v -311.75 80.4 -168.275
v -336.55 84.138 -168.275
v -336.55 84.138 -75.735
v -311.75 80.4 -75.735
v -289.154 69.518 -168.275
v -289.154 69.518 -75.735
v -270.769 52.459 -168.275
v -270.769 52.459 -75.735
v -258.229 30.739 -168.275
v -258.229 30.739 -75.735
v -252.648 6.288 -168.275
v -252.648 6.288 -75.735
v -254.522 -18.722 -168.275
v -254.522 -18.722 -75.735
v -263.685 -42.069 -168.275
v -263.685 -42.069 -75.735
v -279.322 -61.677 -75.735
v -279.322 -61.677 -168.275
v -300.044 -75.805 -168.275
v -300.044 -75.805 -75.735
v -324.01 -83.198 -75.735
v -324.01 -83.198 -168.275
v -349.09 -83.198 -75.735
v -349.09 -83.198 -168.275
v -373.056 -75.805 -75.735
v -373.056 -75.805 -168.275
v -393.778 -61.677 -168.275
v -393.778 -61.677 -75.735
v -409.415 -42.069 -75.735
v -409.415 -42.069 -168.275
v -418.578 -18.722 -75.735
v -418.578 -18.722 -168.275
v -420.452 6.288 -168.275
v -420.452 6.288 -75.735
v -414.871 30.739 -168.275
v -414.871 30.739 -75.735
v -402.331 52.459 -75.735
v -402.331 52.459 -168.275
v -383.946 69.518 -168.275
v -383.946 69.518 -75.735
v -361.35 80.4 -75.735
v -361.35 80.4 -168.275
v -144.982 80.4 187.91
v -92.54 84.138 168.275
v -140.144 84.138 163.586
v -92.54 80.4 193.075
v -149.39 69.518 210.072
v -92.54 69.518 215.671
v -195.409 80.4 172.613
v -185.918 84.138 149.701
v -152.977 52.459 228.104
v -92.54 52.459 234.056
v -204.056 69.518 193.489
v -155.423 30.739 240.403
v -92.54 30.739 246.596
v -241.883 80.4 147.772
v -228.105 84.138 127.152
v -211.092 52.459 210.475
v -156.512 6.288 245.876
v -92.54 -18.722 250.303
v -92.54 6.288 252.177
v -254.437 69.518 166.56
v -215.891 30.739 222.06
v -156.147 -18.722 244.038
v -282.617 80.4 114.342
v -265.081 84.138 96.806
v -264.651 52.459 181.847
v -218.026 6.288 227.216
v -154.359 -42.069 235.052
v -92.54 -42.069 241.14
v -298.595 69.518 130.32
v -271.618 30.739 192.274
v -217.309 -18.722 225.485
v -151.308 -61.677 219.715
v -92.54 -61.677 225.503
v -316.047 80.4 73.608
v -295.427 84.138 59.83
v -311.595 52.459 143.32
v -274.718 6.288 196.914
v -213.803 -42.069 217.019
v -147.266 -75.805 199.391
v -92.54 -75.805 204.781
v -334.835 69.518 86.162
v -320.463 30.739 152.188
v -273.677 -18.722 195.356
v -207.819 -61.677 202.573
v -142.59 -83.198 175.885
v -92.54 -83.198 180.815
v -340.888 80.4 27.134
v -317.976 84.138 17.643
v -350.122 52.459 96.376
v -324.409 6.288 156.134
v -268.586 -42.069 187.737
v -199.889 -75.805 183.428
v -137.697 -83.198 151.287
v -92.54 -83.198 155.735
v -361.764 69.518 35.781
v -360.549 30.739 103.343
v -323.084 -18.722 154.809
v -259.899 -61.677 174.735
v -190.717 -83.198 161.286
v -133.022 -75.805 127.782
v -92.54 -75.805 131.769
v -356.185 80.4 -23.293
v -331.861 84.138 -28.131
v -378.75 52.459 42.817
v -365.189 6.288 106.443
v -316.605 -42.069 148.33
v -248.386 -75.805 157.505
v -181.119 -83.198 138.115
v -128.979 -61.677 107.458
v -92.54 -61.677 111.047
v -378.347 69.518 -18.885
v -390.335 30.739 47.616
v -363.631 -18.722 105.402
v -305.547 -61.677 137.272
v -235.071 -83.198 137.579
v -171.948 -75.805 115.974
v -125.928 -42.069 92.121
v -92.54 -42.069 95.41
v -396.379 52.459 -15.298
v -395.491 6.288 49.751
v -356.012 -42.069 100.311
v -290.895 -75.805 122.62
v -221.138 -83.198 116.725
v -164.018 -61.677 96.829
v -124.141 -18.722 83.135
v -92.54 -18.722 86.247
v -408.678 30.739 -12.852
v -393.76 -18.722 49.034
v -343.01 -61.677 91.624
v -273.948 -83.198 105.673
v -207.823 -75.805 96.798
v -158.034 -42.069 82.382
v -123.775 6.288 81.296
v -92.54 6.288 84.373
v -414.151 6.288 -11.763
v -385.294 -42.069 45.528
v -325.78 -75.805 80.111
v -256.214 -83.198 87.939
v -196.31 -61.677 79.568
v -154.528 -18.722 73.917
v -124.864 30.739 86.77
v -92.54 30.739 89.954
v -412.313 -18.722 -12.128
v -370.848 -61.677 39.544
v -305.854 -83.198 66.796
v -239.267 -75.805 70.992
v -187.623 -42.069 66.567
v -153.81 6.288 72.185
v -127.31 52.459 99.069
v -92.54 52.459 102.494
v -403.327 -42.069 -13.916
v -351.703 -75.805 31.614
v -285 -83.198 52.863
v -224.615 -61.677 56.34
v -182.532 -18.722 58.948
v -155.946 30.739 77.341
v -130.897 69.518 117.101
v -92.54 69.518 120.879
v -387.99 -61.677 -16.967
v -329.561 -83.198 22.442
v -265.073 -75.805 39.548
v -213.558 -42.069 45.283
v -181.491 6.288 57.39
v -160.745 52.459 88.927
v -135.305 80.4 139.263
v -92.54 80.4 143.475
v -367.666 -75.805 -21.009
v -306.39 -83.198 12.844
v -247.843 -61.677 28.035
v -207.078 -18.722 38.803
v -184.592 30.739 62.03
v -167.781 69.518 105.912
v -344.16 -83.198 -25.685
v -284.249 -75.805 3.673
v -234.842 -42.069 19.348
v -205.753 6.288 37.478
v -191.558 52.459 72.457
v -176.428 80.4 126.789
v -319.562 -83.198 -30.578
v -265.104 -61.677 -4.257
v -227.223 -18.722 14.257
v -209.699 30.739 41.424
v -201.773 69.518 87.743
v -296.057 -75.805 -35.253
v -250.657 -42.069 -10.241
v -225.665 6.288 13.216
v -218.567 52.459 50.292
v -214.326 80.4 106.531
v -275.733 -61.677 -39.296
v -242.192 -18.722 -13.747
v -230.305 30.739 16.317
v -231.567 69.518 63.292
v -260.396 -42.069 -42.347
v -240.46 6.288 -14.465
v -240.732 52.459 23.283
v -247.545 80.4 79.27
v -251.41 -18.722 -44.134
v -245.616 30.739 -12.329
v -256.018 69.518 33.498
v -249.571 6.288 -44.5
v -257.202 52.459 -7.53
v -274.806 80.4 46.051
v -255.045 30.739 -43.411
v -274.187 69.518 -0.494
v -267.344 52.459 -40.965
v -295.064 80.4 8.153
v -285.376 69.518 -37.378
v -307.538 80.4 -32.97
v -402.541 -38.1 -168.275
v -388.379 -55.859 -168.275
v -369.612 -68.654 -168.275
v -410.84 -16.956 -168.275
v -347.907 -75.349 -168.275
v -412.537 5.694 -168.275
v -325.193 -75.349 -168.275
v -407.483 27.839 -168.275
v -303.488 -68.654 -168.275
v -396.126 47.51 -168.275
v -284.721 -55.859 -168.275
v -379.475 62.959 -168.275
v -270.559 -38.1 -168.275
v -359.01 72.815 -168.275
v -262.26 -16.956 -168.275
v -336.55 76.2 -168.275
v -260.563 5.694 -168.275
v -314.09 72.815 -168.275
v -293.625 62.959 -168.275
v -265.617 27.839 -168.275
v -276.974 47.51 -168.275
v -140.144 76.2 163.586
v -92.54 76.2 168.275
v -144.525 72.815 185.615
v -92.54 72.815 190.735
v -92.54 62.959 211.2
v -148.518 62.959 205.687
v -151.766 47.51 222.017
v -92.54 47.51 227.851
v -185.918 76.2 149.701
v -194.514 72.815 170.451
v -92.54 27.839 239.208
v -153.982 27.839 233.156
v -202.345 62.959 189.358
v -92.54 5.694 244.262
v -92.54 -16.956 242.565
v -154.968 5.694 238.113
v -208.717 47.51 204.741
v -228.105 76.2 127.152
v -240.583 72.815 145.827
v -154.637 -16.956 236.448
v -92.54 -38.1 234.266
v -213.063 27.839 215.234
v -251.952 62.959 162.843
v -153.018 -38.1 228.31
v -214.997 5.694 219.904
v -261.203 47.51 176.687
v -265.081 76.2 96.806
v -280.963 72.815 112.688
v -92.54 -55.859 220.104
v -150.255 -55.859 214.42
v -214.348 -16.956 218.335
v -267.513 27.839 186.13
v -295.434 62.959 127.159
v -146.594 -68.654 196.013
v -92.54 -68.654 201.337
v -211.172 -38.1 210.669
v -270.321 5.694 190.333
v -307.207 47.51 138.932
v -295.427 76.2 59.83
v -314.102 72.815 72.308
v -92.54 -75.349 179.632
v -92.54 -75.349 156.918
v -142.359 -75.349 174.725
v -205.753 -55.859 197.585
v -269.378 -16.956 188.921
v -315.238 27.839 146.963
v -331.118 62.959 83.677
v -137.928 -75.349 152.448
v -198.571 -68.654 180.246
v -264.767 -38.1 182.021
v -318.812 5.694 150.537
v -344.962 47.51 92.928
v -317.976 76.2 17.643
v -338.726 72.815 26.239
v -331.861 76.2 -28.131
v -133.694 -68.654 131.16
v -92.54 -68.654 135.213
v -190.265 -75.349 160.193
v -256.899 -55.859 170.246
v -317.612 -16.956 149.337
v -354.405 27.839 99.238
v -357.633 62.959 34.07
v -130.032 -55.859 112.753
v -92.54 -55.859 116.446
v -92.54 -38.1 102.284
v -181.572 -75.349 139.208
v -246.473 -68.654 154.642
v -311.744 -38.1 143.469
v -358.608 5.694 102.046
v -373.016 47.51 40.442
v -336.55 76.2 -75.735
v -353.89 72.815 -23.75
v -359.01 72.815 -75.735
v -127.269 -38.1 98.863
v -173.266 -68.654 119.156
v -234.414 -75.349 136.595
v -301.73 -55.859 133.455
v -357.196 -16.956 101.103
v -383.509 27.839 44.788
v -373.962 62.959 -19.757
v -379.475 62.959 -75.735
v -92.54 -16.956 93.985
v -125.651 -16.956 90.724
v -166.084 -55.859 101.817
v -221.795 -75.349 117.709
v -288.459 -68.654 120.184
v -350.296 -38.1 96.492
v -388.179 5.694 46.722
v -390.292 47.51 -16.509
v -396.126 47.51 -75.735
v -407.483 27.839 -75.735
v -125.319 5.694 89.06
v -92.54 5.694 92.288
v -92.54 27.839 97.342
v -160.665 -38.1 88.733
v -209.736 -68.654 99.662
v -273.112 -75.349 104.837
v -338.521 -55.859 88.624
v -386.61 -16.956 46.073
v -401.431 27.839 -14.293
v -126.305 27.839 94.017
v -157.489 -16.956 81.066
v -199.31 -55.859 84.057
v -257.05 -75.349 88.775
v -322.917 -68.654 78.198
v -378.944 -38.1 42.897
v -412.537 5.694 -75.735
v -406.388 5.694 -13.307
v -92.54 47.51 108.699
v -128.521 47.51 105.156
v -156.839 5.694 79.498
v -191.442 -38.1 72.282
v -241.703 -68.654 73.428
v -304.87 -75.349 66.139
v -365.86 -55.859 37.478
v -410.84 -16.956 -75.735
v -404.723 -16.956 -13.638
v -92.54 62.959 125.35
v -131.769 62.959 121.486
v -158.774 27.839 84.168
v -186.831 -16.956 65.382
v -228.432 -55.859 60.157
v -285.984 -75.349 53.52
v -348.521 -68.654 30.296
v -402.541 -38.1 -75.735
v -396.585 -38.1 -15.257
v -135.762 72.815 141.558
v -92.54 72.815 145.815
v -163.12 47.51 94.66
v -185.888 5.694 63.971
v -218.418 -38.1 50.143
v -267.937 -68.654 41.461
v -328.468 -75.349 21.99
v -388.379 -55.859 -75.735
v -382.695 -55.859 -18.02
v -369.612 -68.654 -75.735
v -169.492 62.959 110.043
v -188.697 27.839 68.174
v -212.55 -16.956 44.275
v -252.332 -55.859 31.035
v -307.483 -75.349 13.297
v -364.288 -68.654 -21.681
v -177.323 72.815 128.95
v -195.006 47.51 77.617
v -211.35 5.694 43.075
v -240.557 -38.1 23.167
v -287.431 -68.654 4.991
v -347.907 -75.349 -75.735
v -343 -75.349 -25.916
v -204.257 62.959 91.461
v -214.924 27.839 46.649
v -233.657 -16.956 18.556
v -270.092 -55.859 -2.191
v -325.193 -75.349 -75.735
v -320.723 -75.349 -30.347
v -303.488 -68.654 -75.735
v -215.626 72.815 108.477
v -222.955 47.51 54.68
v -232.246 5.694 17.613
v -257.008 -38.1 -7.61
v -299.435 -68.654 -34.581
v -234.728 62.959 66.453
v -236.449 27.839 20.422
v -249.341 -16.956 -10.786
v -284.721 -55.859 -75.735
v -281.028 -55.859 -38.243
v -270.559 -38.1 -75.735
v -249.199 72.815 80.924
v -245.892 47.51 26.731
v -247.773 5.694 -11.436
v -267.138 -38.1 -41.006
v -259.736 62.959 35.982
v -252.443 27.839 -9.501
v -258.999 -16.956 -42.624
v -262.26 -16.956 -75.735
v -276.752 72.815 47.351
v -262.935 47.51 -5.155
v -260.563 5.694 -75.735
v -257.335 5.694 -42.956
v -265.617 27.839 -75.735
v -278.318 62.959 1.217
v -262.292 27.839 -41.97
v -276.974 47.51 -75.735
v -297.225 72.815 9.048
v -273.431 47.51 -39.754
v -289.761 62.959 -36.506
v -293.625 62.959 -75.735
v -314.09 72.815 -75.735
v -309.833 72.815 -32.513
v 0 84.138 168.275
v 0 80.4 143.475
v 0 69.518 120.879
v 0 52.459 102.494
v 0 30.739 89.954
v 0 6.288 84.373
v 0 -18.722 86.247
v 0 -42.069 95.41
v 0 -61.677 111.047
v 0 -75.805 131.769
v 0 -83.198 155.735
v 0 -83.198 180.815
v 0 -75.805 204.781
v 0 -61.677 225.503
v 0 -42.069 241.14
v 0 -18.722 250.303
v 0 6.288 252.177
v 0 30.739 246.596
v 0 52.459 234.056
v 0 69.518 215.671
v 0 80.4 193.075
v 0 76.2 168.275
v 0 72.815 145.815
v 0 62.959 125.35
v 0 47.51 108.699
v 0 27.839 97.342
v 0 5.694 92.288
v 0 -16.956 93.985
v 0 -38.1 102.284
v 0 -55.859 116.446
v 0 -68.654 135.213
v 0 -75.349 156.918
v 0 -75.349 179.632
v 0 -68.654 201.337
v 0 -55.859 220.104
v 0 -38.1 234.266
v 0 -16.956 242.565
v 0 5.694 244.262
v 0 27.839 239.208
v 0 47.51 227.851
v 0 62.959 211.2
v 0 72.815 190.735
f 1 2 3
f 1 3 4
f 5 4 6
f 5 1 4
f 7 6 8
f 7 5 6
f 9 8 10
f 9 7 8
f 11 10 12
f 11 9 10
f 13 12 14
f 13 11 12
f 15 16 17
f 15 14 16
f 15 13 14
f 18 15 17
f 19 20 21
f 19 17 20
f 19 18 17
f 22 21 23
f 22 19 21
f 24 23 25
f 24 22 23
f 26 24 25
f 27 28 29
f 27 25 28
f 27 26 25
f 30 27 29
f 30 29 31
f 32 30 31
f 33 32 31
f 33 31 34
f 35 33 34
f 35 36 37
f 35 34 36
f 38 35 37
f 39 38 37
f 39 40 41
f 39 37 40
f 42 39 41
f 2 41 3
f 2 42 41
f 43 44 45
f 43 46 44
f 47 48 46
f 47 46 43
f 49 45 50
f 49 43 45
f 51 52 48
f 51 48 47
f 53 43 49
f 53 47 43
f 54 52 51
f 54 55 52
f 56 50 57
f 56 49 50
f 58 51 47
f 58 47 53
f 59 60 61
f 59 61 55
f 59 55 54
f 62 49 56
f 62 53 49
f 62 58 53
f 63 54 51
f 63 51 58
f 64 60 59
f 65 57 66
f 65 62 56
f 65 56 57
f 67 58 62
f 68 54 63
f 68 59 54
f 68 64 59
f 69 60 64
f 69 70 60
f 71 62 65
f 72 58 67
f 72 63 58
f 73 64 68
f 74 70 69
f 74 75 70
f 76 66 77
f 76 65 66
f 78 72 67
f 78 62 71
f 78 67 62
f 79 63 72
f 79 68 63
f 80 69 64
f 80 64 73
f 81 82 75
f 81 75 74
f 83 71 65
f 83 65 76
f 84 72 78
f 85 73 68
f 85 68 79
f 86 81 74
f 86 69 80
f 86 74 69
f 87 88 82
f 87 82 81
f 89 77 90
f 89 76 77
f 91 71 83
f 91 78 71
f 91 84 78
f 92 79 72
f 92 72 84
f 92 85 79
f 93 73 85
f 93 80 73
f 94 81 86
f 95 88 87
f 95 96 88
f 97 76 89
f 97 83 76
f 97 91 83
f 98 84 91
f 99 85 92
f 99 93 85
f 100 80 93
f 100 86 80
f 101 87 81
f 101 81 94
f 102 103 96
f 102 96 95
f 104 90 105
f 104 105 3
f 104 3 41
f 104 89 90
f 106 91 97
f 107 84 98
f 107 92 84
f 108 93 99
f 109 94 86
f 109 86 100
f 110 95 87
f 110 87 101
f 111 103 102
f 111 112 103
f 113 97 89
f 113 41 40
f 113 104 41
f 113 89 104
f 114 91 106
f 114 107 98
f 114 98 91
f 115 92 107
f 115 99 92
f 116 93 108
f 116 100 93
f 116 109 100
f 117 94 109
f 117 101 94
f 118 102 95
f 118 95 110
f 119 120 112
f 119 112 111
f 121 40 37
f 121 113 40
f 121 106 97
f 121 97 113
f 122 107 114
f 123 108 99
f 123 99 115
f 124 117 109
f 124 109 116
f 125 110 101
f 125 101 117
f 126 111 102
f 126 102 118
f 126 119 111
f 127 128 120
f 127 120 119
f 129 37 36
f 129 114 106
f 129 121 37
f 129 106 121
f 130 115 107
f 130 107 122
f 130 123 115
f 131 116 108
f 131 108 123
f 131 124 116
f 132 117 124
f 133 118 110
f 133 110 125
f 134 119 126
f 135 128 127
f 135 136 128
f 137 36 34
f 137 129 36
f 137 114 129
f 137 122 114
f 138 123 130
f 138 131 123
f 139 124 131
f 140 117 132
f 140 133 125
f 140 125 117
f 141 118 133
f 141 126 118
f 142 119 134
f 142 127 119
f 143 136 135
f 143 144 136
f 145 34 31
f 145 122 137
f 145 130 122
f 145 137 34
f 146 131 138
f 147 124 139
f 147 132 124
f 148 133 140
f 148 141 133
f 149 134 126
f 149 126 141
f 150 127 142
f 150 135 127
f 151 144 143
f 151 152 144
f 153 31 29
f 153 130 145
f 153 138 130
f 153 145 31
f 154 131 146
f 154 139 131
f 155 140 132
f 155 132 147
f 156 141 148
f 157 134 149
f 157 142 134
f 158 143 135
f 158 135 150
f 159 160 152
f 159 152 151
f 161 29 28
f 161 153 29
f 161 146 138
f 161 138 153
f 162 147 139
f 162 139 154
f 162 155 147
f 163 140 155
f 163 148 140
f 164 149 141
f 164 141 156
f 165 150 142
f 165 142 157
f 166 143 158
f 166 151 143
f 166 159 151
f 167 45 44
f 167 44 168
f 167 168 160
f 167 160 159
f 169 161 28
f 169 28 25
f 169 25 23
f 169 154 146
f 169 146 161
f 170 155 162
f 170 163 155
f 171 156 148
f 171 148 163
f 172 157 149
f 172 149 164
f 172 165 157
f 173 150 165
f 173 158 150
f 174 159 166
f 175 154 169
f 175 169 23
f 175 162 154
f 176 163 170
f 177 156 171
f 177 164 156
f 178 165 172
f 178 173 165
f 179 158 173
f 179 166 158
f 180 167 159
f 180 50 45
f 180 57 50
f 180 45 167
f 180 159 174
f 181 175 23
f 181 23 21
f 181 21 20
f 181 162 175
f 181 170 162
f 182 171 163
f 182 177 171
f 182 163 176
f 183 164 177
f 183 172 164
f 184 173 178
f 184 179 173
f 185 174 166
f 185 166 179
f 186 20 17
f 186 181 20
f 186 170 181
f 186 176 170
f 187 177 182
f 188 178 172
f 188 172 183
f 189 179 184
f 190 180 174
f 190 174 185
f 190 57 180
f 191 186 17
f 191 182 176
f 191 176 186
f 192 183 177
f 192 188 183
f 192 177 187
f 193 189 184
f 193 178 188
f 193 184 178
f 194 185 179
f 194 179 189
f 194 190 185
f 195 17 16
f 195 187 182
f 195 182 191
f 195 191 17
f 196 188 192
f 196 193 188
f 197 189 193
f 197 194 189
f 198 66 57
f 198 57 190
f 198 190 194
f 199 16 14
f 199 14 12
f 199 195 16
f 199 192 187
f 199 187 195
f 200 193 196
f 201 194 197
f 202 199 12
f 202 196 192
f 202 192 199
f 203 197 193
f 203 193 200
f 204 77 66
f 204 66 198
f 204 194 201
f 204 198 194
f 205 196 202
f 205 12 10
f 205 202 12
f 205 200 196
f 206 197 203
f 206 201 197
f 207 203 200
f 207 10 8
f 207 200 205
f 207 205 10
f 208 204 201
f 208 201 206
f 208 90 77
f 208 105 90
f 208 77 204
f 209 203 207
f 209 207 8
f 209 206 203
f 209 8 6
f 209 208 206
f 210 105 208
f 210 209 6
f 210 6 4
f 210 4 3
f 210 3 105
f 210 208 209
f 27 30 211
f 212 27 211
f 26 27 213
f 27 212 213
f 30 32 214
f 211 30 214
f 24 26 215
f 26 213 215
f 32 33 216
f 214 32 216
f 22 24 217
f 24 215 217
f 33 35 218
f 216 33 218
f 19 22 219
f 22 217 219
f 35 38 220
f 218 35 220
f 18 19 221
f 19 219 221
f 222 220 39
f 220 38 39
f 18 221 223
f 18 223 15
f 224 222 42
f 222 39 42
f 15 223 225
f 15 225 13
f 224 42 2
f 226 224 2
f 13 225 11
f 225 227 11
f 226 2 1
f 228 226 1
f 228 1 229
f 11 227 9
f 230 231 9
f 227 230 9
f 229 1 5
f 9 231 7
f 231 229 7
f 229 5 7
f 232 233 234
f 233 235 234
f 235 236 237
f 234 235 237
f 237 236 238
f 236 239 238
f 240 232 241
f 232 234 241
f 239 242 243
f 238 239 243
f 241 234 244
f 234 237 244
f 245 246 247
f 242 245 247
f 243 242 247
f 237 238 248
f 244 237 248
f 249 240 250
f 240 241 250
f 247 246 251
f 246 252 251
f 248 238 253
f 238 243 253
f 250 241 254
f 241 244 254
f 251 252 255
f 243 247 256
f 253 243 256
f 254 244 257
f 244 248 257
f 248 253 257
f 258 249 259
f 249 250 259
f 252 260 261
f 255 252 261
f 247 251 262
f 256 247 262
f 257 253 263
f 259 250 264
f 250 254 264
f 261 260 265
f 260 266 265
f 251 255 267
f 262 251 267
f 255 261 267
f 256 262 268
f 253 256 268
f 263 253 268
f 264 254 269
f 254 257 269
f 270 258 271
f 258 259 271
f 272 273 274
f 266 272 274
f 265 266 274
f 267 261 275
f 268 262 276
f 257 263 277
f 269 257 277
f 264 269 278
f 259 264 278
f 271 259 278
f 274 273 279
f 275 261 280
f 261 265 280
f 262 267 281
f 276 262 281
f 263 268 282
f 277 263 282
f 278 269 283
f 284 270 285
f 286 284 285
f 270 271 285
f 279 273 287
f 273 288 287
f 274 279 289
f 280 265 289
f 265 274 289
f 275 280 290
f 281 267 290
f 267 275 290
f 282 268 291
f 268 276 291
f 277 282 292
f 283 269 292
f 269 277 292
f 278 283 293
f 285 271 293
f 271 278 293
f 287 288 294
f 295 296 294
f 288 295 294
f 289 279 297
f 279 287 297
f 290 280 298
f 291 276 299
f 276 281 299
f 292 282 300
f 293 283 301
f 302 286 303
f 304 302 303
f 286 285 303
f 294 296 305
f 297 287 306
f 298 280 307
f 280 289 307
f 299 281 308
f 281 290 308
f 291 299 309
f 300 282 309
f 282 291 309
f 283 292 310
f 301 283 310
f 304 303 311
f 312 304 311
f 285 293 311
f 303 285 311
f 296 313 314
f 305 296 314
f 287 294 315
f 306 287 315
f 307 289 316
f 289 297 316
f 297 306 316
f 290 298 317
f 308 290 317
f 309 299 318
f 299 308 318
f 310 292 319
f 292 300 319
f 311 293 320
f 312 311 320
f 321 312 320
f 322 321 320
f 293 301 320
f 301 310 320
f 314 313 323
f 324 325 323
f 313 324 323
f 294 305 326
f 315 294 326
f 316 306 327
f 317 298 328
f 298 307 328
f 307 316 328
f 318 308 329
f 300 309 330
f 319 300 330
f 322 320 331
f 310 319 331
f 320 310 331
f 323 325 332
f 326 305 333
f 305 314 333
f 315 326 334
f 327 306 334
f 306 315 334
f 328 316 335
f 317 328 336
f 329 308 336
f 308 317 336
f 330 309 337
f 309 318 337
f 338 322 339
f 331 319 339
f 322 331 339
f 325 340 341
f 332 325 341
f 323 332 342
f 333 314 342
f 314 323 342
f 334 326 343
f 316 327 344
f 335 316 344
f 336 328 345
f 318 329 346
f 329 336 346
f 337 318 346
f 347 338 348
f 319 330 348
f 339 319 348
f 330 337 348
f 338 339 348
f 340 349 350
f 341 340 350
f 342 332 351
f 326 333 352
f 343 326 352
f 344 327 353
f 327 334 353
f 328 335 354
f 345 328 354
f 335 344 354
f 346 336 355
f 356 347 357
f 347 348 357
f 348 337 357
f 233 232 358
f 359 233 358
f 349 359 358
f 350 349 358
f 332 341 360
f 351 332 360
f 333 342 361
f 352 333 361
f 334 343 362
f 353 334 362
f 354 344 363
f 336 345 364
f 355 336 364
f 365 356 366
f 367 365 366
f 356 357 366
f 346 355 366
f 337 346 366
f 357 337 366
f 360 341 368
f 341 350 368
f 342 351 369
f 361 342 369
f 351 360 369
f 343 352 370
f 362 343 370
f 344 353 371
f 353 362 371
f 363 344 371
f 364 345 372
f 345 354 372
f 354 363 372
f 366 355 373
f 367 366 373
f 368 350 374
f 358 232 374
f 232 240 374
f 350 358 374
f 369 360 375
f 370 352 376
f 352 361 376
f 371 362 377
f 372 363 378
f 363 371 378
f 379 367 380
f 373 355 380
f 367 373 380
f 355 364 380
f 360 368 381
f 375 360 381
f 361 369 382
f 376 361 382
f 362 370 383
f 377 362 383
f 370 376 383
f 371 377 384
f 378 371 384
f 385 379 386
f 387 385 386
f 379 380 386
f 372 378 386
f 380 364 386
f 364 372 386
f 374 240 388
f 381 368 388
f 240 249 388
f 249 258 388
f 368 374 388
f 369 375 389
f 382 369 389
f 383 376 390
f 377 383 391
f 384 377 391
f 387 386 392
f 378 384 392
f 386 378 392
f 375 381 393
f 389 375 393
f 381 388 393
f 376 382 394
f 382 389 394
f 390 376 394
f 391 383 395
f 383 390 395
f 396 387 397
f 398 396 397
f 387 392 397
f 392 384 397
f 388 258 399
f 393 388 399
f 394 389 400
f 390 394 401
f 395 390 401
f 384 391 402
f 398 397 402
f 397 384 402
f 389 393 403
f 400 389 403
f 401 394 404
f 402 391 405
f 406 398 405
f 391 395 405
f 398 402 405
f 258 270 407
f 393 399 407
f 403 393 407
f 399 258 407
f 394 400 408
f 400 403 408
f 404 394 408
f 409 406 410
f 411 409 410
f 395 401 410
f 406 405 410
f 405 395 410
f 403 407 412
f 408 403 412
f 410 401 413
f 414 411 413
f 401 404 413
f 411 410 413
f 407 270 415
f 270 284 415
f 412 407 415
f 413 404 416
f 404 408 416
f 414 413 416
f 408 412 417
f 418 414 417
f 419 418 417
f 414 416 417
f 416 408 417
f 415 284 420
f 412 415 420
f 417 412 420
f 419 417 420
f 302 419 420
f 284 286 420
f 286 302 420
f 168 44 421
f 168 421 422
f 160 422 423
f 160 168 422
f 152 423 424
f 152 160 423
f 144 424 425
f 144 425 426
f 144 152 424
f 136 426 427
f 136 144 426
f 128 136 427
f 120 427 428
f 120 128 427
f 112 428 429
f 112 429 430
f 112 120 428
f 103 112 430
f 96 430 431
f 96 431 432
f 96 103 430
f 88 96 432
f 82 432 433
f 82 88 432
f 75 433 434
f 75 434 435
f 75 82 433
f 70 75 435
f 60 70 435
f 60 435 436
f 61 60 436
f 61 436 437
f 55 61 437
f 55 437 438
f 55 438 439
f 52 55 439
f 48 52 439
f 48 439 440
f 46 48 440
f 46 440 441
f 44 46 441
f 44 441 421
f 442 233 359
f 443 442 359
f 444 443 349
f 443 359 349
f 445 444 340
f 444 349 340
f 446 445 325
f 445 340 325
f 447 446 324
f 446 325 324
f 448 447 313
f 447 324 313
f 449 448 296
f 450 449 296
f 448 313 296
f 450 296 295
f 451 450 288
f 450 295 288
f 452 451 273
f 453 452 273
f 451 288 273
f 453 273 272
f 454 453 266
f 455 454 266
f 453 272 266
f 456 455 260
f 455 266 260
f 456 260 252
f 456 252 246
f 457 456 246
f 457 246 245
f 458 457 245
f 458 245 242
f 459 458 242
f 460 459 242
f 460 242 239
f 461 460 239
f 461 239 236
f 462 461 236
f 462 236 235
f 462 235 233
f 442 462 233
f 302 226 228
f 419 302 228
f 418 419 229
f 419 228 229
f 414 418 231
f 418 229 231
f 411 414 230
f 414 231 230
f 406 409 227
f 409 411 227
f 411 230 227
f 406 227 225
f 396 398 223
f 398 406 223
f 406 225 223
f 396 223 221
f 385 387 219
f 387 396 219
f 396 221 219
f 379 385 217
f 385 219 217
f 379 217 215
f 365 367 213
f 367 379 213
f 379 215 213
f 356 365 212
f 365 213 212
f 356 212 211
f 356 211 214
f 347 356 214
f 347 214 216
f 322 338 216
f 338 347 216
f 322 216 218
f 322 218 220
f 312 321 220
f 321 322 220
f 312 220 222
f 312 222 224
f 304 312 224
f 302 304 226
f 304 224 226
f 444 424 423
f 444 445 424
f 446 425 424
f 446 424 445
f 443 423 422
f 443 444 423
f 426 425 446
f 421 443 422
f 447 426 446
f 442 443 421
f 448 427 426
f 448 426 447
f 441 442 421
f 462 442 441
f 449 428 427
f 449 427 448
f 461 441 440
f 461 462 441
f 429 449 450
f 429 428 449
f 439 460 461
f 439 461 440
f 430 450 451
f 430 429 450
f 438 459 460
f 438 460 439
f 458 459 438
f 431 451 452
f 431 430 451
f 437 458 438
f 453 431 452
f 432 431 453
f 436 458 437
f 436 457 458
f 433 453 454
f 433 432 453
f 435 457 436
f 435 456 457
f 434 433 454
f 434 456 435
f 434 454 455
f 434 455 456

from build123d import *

# Parameters (mm, degrees)
F1_R   = 84.1375
F1_R_2 = 76.2


with BuildPart() as f2:
    # F2: sweep along a path in F0
    with BuildLine(Plane.XZ) as f2_path:
        Line((0, 168.275), (-92.539645279, 168.275))
        ThreePointArc((-92.539645279, 168.275), (-265.081021782, 96.806021782), (-336.55, -75.735354721))
        Line((-336.55, -75.735354721), (-336.55, -168.275))
    # F1 (on Right) → F2 (sweep)
    with BuildSketch(Plane.YZ):
        with Locations((0, 168.275)):
            Circle(F1_R)
        with Locations((0, 168.275)):
            Circle(F1_R_2, mode=Mode.SUBTRACT)
    sweep(path=f2_path.line)


solid = f2.part
